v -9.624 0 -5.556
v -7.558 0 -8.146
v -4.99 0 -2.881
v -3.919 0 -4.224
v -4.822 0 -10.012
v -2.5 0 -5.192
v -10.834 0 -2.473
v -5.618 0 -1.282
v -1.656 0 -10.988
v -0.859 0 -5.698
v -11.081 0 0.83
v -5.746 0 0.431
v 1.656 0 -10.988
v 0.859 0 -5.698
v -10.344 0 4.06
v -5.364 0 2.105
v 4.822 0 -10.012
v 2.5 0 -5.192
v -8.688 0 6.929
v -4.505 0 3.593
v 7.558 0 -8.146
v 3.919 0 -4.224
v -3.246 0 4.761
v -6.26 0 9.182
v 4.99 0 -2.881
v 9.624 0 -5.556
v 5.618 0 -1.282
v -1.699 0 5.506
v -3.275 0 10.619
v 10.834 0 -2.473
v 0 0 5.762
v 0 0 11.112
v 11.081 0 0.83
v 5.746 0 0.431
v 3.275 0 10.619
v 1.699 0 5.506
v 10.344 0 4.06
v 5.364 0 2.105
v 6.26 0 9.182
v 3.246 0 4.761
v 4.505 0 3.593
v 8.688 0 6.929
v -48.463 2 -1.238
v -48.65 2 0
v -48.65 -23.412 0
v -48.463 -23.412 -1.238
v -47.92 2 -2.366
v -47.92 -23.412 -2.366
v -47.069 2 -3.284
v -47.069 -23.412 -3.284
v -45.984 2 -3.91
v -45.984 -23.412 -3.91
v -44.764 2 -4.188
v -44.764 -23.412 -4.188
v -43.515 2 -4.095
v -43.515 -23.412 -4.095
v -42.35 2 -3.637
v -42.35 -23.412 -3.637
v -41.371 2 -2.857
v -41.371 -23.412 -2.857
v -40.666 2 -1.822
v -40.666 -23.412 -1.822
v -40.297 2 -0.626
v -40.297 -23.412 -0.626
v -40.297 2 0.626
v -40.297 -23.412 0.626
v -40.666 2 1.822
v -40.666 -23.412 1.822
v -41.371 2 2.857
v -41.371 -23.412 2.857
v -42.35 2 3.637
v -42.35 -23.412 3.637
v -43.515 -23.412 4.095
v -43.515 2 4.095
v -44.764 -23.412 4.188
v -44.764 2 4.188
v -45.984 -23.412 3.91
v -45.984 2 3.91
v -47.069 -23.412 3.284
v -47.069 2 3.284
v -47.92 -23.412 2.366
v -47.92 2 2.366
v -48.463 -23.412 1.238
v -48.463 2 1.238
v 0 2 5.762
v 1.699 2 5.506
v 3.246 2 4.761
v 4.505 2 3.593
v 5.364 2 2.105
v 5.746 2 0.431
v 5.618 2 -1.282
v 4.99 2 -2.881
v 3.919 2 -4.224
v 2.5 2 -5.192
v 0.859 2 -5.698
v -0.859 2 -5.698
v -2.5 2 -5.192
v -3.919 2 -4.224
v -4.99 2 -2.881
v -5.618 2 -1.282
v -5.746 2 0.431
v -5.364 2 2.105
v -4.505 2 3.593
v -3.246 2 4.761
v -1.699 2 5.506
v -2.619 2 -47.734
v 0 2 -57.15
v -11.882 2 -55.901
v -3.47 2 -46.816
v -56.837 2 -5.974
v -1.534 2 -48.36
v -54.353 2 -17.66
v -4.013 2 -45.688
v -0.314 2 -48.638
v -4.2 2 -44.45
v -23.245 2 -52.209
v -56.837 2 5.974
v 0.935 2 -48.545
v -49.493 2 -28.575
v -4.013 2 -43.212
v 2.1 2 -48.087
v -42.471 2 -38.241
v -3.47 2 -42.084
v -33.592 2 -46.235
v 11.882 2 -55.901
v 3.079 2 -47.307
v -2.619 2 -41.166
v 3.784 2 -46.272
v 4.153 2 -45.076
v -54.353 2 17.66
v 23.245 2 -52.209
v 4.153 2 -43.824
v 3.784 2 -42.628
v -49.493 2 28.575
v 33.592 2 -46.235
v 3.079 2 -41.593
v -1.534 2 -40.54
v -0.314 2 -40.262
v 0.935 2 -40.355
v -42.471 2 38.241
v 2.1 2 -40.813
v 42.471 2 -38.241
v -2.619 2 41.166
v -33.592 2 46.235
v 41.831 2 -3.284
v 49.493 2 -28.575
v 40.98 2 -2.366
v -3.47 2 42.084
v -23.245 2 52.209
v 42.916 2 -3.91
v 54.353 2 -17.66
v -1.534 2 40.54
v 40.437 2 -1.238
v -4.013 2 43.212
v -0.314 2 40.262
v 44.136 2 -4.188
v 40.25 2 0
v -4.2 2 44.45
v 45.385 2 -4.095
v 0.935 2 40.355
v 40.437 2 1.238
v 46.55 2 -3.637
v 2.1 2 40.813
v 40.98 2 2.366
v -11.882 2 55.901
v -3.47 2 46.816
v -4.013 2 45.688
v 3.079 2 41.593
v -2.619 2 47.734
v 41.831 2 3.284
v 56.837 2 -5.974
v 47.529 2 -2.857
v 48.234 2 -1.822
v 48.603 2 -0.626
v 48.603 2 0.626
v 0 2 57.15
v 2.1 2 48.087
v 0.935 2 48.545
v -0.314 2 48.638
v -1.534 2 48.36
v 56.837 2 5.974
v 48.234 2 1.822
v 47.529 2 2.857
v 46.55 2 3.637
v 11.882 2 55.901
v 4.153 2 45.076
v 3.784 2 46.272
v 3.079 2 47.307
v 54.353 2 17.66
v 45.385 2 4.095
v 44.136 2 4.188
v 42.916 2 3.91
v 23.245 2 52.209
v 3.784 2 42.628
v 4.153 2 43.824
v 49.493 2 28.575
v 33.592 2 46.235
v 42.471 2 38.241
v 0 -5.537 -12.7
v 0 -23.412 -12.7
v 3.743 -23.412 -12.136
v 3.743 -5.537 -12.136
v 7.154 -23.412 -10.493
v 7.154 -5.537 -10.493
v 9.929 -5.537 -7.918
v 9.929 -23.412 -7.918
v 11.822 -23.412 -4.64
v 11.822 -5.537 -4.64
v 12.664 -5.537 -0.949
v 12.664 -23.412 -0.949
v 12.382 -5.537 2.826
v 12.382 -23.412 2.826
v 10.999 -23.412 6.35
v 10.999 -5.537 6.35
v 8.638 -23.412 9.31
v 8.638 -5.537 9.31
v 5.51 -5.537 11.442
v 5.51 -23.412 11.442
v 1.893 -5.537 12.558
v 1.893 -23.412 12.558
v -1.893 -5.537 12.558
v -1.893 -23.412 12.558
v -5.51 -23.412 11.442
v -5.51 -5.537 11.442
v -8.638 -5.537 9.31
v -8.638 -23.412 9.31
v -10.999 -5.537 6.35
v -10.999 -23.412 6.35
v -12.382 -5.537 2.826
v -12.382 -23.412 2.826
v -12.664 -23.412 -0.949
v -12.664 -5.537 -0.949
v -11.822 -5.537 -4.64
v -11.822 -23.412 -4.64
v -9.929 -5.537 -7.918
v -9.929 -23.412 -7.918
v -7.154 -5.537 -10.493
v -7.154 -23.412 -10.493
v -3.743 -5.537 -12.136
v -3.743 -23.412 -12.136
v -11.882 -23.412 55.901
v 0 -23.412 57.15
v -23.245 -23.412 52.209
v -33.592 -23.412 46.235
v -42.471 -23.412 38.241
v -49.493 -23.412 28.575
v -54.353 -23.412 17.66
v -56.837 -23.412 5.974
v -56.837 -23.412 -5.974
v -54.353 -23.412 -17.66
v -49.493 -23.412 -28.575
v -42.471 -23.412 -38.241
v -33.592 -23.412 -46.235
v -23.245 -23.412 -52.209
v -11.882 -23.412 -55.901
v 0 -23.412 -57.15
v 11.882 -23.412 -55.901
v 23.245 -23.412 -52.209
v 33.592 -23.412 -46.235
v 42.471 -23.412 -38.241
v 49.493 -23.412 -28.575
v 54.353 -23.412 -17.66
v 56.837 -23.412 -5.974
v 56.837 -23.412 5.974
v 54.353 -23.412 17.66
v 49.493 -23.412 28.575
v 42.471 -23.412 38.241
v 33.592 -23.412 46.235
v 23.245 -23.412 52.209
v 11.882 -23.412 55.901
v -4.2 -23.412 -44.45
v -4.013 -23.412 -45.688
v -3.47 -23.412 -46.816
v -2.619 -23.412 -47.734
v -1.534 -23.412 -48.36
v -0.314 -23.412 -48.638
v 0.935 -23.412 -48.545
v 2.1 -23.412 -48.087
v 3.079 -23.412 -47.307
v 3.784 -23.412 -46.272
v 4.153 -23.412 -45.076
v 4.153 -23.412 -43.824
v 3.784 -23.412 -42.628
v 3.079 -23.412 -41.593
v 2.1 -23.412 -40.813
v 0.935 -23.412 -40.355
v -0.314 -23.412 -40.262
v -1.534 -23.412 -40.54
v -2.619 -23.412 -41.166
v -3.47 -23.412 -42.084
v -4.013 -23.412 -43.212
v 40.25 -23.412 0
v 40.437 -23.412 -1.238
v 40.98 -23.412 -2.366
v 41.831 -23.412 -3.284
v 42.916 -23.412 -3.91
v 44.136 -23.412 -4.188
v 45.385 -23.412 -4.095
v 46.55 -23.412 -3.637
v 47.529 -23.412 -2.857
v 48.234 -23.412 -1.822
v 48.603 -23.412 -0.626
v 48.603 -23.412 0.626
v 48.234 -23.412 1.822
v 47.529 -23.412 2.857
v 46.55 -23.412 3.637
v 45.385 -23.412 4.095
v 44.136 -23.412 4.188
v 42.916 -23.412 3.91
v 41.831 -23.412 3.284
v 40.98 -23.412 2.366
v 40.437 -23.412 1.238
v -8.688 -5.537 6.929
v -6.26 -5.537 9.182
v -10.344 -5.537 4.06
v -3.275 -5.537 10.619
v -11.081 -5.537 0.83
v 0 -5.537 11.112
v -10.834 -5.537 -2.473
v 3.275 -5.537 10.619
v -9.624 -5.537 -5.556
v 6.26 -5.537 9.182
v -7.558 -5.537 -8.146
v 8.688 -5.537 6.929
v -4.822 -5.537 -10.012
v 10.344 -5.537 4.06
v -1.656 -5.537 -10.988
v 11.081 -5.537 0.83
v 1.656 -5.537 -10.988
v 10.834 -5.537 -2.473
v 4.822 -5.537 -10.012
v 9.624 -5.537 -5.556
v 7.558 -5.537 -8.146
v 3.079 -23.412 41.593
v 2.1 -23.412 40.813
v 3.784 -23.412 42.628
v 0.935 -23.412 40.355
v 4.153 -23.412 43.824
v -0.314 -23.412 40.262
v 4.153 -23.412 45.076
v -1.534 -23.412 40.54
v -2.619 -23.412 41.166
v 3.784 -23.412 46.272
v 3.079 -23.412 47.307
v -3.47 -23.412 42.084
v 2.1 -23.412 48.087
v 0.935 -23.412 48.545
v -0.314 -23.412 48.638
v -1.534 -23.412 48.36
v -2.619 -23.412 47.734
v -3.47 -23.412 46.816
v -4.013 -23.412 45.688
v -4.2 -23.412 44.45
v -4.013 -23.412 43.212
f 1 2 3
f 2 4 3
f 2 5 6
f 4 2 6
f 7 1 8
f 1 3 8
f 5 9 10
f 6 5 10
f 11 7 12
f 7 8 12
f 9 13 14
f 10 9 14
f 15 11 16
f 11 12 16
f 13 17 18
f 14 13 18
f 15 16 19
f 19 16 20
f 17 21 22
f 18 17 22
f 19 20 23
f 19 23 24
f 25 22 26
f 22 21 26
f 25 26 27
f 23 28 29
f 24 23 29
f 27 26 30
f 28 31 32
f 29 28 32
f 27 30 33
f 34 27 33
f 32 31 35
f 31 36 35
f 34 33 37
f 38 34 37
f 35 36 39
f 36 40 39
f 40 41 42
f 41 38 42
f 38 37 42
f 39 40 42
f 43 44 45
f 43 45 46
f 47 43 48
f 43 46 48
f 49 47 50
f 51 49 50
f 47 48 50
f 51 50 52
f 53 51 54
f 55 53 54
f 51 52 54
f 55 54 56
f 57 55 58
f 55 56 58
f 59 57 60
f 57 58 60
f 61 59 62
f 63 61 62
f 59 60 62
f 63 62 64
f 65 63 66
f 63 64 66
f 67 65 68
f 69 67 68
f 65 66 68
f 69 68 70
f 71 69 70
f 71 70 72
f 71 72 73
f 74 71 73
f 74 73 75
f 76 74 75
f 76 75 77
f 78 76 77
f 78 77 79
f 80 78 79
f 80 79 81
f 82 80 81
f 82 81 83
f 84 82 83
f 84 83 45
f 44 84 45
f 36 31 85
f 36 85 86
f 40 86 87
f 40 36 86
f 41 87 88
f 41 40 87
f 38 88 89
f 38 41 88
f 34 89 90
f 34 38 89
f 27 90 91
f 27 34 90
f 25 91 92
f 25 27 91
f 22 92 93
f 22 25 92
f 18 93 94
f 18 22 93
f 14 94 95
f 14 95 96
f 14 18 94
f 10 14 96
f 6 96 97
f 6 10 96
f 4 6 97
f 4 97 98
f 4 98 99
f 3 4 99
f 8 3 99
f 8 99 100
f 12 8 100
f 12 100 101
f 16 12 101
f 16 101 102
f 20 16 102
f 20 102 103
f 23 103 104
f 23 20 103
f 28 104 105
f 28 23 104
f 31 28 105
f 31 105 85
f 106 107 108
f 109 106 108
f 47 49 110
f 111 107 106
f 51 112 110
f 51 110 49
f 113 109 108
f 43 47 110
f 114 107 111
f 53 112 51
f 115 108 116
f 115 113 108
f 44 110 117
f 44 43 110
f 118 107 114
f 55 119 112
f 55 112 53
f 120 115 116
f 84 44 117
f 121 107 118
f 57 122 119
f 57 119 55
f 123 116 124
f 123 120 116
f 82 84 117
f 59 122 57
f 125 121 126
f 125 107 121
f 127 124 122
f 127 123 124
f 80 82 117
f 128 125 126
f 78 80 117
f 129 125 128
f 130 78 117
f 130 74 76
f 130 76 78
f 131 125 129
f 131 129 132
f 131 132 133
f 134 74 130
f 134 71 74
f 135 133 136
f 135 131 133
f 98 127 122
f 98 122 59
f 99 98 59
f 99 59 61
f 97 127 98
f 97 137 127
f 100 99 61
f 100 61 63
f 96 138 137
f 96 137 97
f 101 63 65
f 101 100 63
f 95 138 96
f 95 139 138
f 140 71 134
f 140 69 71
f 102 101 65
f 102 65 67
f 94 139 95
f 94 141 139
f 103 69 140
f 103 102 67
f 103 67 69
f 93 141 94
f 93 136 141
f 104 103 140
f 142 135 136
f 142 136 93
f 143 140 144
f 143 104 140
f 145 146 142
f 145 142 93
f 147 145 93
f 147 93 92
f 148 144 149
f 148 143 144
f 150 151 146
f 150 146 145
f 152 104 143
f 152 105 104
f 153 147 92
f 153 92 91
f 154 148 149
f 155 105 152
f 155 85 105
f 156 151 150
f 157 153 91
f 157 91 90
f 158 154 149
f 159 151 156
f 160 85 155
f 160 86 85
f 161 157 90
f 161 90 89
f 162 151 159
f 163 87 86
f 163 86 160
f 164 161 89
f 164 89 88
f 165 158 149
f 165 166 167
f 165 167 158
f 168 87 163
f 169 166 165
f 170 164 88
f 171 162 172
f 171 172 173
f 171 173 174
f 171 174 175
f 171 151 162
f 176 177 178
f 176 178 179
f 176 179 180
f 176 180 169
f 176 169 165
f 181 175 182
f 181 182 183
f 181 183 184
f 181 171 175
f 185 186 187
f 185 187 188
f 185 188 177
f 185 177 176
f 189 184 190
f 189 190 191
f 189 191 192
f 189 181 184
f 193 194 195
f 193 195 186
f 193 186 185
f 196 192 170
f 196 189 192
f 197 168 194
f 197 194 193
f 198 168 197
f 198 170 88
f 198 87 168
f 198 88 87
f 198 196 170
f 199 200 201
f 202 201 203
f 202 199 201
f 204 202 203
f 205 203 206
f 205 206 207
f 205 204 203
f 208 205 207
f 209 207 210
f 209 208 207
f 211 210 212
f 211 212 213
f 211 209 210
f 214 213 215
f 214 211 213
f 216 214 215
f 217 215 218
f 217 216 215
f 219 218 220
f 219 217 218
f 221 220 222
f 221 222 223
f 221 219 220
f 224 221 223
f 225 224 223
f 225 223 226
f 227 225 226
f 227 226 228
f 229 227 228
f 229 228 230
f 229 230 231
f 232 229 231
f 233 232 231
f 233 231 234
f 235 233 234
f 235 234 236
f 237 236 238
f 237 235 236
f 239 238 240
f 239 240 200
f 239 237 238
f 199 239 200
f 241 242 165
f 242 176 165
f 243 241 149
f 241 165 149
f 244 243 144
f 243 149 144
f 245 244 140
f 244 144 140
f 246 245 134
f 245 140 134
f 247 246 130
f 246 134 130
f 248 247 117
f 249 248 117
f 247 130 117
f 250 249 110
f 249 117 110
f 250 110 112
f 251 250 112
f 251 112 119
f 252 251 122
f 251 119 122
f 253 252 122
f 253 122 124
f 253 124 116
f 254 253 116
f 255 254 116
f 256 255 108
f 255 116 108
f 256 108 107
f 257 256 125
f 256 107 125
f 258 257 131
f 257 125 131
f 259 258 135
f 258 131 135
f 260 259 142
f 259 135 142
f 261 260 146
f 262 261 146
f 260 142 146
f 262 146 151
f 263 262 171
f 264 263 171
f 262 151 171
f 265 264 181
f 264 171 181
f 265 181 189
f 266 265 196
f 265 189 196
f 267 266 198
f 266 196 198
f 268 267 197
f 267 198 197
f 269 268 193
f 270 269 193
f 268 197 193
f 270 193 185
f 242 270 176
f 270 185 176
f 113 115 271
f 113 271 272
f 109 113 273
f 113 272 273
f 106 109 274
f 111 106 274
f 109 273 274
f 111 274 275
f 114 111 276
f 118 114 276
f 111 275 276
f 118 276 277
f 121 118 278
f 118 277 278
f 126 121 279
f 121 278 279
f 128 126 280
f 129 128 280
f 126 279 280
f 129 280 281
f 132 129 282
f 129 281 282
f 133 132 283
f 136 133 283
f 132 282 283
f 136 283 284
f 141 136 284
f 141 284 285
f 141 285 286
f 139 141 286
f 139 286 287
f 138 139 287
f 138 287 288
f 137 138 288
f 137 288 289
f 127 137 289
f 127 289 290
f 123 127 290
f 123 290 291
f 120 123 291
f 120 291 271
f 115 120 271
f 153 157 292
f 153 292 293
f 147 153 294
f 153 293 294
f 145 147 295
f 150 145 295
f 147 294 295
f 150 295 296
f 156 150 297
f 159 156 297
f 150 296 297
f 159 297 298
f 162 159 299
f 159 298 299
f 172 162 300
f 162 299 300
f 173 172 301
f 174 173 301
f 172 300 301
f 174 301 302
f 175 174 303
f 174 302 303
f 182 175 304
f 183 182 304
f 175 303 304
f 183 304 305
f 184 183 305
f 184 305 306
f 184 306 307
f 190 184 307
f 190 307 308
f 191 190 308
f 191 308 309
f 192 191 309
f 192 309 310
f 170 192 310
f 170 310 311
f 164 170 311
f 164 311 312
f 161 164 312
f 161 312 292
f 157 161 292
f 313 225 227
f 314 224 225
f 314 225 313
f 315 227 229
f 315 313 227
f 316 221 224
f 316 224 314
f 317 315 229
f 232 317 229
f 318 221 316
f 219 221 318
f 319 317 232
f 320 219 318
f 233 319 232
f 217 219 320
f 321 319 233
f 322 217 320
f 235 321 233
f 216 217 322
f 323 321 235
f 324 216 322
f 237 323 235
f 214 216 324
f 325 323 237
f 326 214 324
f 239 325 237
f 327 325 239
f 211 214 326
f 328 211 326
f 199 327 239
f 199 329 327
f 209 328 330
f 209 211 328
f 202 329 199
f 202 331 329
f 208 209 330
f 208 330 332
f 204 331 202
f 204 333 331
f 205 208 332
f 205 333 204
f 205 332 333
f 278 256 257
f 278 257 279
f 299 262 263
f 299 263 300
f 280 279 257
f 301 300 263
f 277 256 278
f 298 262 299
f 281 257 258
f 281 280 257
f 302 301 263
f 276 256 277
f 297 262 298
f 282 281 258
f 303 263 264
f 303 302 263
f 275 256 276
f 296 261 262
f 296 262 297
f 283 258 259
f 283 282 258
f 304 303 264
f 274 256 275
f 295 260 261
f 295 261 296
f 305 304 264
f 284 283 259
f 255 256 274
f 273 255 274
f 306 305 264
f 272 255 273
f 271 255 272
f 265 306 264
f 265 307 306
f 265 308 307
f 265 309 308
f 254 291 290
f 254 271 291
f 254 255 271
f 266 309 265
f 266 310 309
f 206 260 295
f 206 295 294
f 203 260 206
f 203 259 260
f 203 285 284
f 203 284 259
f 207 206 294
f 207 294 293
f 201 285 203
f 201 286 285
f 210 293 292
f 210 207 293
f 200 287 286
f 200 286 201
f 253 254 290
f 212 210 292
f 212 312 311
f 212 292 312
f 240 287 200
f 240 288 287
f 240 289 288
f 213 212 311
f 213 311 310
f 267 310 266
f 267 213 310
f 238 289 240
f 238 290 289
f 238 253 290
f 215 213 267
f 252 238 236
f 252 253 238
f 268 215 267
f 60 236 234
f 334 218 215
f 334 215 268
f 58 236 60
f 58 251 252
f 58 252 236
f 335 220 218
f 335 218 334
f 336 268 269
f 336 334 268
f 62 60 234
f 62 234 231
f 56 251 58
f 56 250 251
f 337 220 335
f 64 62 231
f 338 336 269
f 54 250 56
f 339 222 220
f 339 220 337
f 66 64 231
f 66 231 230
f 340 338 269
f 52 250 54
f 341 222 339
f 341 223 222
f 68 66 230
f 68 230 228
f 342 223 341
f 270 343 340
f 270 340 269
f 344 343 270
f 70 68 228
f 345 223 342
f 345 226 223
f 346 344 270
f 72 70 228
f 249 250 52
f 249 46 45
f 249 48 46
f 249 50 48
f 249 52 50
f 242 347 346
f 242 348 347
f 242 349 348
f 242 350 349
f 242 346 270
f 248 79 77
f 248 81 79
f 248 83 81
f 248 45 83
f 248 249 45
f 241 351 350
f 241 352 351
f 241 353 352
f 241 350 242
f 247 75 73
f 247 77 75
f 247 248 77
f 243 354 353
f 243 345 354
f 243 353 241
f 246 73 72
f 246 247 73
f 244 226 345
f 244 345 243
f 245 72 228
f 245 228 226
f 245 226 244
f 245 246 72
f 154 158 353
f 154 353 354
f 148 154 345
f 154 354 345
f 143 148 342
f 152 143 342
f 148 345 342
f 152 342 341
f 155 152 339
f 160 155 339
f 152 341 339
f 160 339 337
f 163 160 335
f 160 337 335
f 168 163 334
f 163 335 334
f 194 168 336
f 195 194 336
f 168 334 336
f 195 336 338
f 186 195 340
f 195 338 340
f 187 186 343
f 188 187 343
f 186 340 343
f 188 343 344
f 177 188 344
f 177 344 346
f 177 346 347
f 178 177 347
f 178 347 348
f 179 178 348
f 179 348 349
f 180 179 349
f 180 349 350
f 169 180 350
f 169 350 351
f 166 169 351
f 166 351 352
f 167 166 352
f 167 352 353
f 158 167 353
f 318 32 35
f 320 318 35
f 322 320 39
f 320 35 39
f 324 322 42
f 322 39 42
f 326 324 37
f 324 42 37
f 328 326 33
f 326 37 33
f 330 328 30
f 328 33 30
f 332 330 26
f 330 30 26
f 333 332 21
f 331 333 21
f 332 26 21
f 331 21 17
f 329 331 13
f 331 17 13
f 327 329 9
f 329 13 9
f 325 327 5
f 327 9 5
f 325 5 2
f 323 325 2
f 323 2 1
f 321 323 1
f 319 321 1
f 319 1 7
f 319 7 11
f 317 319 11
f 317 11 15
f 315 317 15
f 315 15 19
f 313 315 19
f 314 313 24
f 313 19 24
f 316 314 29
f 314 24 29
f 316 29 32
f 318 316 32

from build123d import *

# Parameters (mm, degrees)
SKETCH1_R                          = 57.15
SEAL_SEAT_HIEGHT_DEPTH             = 5.5372
SKETCH2_R                          = 57.15
SEAL_DIAPHRAM_HIEGHT_DEPTH         = 15.875
SEAL_START                         = 2
SKETCH3_R                          = 57.15
SEAL_SHOULDER_HIEGHT_DEPTH         = 2
SKETCH4_R                          = 57.15
BOTTOM_SEAL_CLEARANCE_DEPTH        = 2
SKETCH5_R                          = 11.1125
SEAL_SEAT_FIT_DEPTH                = 5.5372
SEAL_DIAPHRAM_CLEARANCE_DEPTH      = 2
SEAL_DIAPHRAM_CLEARANCE_DEPTH_BACK = 15.875
SKETCH6_R                          = 12.7
SKETCH7_R                          = 5.7625
SHAFT_CLEARANCE_DEPTH              = 2
M8_CLEARANCE_HOLE1_D               = 8.4


with BuildPart() as part:
    # Sketch1 → seal seat hieght (new body)
    with BuildSketch(Plane(origin=(0, 0, 0), x_dir=(1, 0, 0), z_dir=(0, 1, 0))):
        with Locations(Location((0, 0, 0), (0, 0, 270))):
            Circle(SKETCH1_R)
    extrude(amount=-SEAL_SEAT_HIEGHT_DEPTH)

    # Sketch2 → seal diaphram hieght (add)
    with BuildSketch(Plane.XZ.offset(5.5372)):
        with Locations(Location((0, 0, 0), (0, 0, 90))):
            Circle(SKETCH2_R)
    extrude(amount=SEAL_DIAPHRAM_HIEGHT_DEPTH)

    # Sketch3 → seal shoulder hieght (add)
    with BuildSketch(Plane(origin=(0, 0, 0), x_dir=(1, 0, 0), z_dir=(0, 1, 0)).offset(SEAL_START)):
        with Locations(Location((0, 0, 0), (0, 0, 270))):
            Circle(SKETCH3_R)
    extrude(amount=-SEAL_SHOULDER_HIEGHT_DEPTH)

    # Sketch4 → bottom seal clearance (add)
    with BuildSketch(Plane.XZ.offset(21.4122)):
        with Locations(Location((0, 0, 0), (0, 0, 90))):
            Circle(SKETCH4_R)
    extrude(amount=BOTTOM_SEAL_CLEARANCE_DEPTH)

    # Sketch5 → seal seat fit (cut)
    with BuildSketch(Plane(origin=(0, 0, 0), x_dir=(1, 0, 0), z_dir=(0, 1, 0))):
        with Locations(Location((0, 0, 0), (0, 0, 270))):
            Circle(SKETCH5_R)
    extrude(amount=-SEAL_SEAT_FIT_DEPTH, mode=Mode.SUBTRACT)

    # Sketch6 → seal diaphram clearance (cut, two sides: drawn at the far end of the back side and taken through both)
    with BuildSketch(Plane(origin=(0, -21.4122, 0), x_dir=(-1, 0, 0), z_dir=(0, -1, 0)).offset(-SEAL_DIAPHRAM_CLEARANCE_DEPTH_BACK)):
        with Locations(Location((0, 0, 0), (0, 0, 90))):
            Circle(SKETCH6_R)
    extrude(amount=SEAL_DIAPHRAM_CLEARANCE_DEPTH + SEAL_DIAPHRAM_CLEARANCE_DEPTH_BACK, mode=Mode.SUBTRACT)

    # Sketch7 → shaft clearance (cut)
    with BuildSketch(Plane(origin=(0, 0, 0), x_dir=(1, 0, 0), z_dir=(0, 1, 0))):
        with Locations(Location((0, 0, 0), (0, 0, 270))):
            Circle(SKETCH7_R)
    extrude(amount=SHAFT_CLEARANCE_DEPTH, mode=Mode.SUBTRACT)

    # M8 Clearance Hole1 (through all)
    with Locations(Plane(origin=(0, 2, 0), x_dir=(1, 0, 0), z_dir=(0, 1, 0))):
        with Locations((-44.45, 0), (0, 44.45), (44.45, 0), (0, -44.45)):
            Hole(M8_CLEARANCE_HOLE1_D / 2)


solid = part.part
